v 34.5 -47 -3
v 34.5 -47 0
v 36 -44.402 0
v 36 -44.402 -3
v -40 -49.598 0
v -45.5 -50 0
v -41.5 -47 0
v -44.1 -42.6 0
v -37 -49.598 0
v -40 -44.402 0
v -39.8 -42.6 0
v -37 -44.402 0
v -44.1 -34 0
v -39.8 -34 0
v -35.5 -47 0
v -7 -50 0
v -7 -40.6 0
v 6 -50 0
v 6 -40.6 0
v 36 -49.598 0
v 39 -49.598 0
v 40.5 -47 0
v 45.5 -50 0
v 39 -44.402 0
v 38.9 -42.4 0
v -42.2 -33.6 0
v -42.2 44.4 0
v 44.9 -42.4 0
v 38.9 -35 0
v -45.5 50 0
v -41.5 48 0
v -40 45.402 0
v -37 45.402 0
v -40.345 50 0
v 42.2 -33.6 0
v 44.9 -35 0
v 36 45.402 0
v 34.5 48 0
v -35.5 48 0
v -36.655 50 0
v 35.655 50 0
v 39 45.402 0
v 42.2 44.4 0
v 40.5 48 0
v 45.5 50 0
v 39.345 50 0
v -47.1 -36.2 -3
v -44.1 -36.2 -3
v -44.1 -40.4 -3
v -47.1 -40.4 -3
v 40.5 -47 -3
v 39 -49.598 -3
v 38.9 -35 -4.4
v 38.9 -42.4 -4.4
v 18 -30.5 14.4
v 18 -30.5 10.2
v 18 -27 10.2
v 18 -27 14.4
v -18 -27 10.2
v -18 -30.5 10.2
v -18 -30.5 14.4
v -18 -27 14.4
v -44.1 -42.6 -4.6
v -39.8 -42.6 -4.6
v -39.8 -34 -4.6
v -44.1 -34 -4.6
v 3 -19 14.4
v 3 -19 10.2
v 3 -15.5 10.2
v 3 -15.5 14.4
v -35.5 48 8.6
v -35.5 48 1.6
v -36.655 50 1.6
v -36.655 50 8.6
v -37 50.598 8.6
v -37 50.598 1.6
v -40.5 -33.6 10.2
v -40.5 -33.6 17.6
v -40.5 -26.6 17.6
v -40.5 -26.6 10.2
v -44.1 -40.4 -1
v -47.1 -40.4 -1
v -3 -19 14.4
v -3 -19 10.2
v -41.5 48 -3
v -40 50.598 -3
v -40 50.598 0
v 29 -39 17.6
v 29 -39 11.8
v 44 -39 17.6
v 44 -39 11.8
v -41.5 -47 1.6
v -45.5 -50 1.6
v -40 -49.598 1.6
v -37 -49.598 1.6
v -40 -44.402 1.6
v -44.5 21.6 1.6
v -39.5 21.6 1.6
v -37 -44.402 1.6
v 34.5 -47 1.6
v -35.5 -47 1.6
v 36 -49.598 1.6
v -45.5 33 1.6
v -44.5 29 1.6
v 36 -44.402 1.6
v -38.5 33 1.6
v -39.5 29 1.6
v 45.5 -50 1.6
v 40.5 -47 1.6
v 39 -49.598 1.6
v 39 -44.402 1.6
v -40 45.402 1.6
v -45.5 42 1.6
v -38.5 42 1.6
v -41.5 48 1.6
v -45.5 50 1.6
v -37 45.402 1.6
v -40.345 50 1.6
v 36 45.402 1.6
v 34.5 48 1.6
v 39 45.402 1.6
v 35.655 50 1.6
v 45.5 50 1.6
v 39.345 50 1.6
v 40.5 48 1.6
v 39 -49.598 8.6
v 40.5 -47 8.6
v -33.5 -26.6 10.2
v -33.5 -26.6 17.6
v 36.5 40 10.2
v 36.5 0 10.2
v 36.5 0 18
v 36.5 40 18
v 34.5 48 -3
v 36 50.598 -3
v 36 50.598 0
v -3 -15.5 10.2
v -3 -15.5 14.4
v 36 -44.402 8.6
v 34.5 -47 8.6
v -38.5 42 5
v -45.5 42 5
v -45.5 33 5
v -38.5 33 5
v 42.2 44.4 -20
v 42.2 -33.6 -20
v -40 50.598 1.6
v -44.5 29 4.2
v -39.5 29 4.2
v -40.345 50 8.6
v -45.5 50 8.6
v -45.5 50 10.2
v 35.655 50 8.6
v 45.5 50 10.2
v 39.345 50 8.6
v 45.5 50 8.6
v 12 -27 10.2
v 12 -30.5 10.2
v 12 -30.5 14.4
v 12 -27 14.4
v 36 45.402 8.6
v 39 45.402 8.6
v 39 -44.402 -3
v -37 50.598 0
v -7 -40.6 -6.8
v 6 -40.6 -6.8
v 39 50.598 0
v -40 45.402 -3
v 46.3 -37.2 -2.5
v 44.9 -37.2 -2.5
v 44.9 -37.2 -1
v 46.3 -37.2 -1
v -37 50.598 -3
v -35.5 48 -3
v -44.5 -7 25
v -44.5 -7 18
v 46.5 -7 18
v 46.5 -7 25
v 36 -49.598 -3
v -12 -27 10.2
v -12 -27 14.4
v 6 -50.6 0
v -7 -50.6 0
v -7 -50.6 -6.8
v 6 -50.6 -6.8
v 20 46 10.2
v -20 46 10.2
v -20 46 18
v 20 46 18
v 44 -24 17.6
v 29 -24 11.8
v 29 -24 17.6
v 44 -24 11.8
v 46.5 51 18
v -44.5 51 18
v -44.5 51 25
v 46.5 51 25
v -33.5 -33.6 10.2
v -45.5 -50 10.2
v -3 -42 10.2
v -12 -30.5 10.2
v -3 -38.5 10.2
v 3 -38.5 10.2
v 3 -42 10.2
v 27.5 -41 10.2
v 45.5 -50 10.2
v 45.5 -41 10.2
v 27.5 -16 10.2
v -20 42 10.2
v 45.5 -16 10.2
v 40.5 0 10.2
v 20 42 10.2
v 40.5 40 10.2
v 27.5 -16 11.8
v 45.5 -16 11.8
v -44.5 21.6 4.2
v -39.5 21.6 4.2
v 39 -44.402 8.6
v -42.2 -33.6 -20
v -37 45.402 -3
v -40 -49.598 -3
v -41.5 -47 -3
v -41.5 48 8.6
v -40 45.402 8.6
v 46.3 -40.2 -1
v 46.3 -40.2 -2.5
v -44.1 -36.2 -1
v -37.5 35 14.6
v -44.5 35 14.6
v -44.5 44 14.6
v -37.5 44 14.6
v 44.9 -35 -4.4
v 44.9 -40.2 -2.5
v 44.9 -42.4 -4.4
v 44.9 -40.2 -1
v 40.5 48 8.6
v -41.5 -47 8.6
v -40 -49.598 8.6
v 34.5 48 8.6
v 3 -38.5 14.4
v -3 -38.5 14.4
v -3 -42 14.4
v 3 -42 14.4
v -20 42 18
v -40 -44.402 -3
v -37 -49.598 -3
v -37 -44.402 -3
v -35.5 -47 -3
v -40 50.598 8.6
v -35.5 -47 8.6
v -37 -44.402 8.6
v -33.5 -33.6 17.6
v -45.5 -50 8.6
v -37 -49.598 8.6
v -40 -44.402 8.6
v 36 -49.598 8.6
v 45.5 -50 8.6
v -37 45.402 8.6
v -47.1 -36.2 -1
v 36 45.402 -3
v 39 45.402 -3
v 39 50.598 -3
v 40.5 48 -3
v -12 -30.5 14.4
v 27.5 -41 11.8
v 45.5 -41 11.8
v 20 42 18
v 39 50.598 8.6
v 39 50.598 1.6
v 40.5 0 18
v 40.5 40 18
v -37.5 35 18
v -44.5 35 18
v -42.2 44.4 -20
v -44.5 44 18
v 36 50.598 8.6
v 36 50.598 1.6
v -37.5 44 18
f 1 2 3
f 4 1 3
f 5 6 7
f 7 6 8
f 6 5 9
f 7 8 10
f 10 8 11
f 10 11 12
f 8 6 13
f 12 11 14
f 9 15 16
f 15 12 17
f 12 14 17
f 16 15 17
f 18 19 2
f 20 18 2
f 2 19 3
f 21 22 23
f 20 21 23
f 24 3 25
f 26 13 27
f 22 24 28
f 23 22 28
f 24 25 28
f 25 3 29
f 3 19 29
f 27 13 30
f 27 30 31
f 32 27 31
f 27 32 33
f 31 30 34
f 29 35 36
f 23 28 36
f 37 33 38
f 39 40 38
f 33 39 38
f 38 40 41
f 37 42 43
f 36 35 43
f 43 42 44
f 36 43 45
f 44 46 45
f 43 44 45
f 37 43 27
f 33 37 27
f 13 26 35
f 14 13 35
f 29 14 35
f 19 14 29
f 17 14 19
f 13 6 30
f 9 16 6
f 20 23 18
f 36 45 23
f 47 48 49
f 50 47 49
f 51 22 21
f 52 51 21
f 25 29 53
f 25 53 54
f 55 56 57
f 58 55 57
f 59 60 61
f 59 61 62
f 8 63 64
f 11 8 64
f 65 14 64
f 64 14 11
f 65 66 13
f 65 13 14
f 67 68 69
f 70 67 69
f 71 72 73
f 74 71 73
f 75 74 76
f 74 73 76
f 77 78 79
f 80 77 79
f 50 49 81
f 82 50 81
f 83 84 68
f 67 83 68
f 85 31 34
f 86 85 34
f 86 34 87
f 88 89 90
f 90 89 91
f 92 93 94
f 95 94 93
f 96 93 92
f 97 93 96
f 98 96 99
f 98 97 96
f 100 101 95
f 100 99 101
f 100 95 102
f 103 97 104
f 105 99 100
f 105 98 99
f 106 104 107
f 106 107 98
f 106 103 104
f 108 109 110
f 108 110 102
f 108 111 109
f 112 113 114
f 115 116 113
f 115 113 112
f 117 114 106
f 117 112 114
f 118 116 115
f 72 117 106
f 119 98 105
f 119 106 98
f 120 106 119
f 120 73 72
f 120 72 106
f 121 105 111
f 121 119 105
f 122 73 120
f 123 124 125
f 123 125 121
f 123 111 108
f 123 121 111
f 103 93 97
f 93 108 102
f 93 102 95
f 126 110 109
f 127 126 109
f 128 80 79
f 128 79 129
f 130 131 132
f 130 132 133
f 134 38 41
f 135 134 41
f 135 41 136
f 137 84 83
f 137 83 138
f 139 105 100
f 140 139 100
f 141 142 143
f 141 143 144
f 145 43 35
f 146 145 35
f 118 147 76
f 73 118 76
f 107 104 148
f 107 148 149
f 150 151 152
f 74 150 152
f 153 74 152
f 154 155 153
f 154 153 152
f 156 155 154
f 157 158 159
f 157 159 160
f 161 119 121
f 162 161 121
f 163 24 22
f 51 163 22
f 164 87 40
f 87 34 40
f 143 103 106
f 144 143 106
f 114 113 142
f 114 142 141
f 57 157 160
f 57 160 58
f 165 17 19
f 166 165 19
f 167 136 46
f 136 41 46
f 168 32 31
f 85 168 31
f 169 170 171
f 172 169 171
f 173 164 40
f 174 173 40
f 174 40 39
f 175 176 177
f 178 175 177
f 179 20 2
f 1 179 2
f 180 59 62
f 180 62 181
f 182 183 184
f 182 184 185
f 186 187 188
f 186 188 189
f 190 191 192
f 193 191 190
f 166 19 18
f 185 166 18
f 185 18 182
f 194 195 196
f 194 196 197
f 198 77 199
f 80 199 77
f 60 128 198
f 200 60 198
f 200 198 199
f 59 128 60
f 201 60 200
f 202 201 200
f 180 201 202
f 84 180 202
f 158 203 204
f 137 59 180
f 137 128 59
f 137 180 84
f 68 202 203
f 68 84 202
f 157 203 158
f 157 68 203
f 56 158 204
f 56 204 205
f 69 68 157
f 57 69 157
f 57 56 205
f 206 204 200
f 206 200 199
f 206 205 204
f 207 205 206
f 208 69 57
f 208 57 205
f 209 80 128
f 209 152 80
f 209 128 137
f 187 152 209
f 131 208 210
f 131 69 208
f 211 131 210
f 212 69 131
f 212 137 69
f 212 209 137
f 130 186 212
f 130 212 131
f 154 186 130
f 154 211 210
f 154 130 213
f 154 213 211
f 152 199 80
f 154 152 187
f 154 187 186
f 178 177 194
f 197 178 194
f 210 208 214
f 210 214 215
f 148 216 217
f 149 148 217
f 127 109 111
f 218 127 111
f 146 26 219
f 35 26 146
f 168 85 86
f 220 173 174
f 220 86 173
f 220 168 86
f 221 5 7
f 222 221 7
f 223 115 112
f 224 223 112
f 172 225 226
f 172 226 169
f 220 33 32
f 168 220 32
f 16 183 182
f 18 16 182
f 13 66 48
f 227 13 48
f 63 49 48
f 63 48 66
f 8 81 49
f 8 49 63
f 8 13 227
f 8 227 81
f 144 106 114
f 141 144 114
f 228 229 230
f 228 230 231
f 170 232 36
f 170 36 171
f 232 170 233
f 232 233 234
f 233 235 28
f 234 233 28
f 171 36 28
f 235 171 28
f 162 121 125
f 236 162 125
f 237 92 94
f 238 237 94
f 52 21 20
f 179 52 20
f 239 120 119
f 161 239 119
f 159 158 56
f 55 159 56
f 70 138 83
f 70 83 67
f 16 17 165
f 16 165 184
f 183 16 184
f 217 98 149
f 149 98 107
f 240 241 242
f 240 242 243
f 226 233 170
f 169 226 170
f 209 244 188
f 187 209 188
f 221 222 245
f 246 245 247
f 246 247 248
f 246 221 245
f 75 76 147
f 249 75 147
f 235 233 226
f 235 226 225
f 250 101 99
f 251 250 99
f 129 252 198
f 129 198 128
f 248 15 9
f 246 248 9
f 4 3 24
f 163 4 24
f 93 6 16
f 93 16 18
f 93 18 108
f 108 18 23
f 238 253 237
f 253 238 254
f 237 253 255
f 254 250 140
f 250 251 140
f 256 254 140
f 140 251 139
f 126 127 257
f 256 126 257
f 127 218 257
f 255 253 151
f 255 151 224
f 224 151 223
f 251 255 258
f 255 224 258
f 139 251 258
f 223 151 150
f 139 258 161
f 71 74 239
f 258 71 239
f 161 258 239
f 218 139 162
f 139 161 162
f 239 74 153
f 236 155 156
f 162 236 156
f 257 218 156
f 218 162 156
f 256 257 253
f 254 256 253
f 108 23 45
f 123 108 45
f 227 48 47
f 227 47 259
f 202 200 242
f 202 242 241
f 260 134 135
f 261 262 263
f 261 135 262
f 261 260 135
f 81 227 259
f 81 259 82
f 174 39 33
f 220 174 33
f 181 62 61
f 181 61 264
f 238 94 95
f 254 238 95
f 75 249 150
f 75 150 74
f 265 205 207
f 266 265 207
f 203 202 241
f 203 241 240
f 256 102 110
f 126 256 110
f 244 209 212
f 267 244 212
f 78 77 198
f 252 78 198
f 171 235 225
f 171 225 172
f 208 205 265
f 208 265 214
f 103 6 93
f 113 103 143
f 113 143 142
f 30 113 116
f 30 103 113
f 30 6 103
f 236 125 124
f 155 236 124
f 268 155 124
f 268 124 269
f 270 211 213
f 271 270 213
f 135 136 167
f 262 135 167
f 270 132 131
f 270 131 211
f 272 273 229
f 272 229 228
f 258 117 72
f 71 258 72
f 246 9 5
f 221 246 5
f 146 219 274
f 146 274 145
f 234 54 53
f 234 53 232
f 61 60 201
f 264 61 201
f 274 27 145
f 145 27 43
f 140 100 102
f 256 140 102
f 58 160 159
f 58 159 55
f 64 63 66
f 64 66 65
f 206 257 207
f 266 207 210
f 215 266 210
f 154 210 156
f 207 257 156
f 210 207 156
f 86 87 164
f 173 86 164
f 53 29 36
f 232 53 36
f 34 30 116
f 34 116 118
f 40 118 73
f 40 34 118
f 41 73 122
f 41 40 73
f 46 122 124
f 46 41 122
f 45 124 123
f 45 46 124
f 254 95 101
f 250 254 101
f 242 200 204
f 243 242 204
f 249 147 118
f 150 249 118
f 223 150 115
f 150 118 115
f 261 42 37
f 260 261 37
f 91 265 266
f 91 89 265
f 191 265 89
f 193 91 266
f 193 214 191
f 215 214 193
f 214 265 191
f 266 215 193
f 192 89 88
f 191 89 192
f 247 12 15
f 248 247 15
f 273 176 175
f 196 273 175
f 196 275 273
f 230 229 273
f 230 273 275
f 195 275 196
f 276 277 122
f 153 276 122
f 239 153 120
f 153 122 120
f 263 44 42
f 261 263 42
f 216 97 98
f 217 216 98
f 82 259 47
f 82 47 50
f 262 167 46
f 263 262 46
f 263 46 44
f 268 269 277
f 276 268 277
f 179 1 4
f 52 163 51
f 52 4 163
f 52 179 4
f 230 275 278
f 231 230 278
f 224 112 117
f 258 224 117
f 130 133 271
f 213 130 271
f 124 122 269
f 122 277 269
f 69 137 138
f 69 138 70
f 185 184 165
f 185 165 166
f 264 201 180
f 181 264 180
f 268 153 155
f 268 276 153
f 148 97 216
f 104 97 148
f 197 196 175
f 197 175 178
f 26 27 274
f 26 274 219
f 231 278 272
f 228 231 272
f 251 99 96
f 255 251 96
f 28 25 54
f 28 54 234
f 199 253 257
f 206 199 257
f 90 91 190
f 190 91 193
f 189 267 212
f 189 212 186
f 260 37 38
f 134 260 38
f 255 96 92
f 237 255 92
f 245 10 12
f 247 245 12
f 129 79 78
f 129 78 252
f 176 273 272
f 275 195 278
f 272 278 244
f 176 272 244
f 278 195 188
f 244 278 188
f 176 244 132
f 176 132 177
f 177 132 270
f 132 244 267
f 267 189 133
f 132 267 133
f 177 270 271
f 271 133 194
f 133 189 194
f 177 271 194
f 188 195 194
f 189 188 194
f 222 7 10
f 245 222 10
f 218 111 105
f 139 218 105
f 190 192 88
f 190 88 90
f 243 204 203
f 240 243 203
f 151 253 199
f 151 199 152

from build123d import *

# Parameters (mm, degrees)
SKETCH001_W   = 91
SKETCH001_H   = 100
PAD_DEPTH     = 1.6
SKETCH002_W   = 84.4
SKETCH002_H   = 78
PAD001_DEPTH  = 20
SKETCH003_W   = 13
SKETCH003_H   = 10
PAD002_DEPTH  = 6.8
SKETCH004_W   = 4.3
SKETCH004_H   = 8.6
PAD003_DEPTH  = 4.6
SKETCH005_W   = 6
SKETCH005_H   = 7.4
PAD004_DEPTH  = 4.4
SKETCH006_W   = 4.2
SKETCH006_H   = 2
PAD005_DEPTH  = 3
SKETCH007_W   = 3
SKETCH007_H   = 1.5
PAD006_DEPTH  = 1.4
PAD007_DEPTH  = 7
SKETCH009_W   = 7
SKETCH009_H   = 9
PAD008_DEPTH  = 3.4
SKETCH010_W   = 5
SKETCH010_H   = 7.4
PAD009_DEPTH  = 2.6
SKETCH011_W   = 91
SKETCH011_H   = 100
PAD010_DEPTH  = 1.6
SKETCH012_W   = 40
SKETCH012_H   = 4
SKETCH012_W_2 = 4
SKETCH012_H_2 = 40
PAD011_DEPTH  = 7.8
SKETCH013_W   = 91
SKETCH013_H   = 58
PAD012_DEPTH  = 7
SKETCH014_W   = 7
SKETCH014_H   = 9
PAD013_DEPTH  = 3.4
PAD014_DEPTH  = 3
SKETCH035_W   = 6
SKETCH035_H   = 3.5
PAD021_DEPTH  = 4.2
SKETCH036_W   = 7
SKETCH036_H   = 7
PAD022_DEPTH  = 7.4
SKETCH037_W   = 18
SKETCH037_H   = 25
PAD023_DEPTH  = 1.6
SKETCH038_W   = 15
SKETCH038_H   = 15
PAD024_DEPTH  = 5.8


with BuildPart() as part:
    # Sketch001 → Pad (new body)
    with BuildSketch(Plane.XY):
        Rectangle(SKETCH001_W, SKETCH001_H)
    extrude(amount=PAD_DEPTH)

    # Sketch002 (on Face5 of Pad) → Pad001 (join)
    with BuildSketch(Plane(origin=(0, 0, 0), x_dir=(1, 0, 0), z_dir=(0, 0, -1))):
        with Locations((0, -5.4)):
            Rectangle(SKETCH002_W, SKETCH002_H)
    extrude(amount=PAD001_DEPTH)

    # Sketch003 (on Face4 of Pad001) → Pad002 (join)
    with BuildSketch(Plane(origin=(0, 0, 0), x_dir=(1, 0, 0), z_dir=(0, 0, -1))):
        with Locations((-0.5, 45.6)):
            Rectangle(SKETCH003_W, SKETCH003_H)
    extrude(amount=PAD002_DEPTH)

    # Sketch004 (on Face4 of Pad002) → Pad003 (join)
    with BuildSketch(Plane(origin=(0, 0, 0), x_dir=(1, 0, 0), z_dir=(0, 0, -1))):
        with Locations((-41.95, 38.3)):
            Rectangle(SKETCH004_W, SKETCH004_H)
    extrude(amount=PAD003_DEPTH)

    # Sketch005 (on Face4 of Pad003) → Pad004 (join)
    with BuildSketch(Plane(origin=(0, 0, 0), x_dir=(1, 0, 0), z_dir=(0, 0, -1))):
        with Locations((41.9, 38.7)):
            Rectangle(SKETCH005_W, SKETCH005_H)
    extrude(amount=PAD004_DEPTH)

    # Sketch006 (on Face14 of Pad004) → Pad005 (join)
    with BuildSketch(Plane(origin=(-44.1, 0, 0), x_dir=(0, -1, 0), z_dir=(-1, 0, 0))):
        with Locations((38.3, -2)):
            Rectangle(SKETCH006_W, SKETCH006_H)
    extrude(amount=PAD005_DEPTH)

    # Sketch007 (on Face12 of Pad005) → Pad006 (join)
    with BuildSketch(Plane.YZ.offset(44.9)):
        with Locations((-38.7, -1.75)):
            Rectangle(SKETCH007_W, SKETCH007_H)
    extrude(amount=PAD006_DEPTH)

    # Sketch008 (on Face5 of Pad006) → Pad007 (join)
    with BuildSketch(Plane.XY.offset(1.6)):
        Polygon((-40, 45.401924), (-37, 45.401924), (-35.5, 48), (-37, 50.598076), (-40, 50.598076), (-41.5, 48), align=None)
        Polygon((39, 45.401924), (40.5, 48), (39, 50.598076), (36, 50.598076), (34.5, 48), (36, 45.401924), align=None)
        Polygon((-37, -49.598076), (-35.5, -47), (-37, -44.401924), (-40, -44.401924), (-41.5, -47), (-40, -49.598076), align=None)
        Polygon((39, -49.598076), (40.5, -47), (39, -44.401924), (36, -44.401924), (34.5, -47), (36, -49.598076), align=None)
    extrude(amount=PAD007_DEPTH)

    # Sketch009 (on Face5 of Pad007) → Pad008 (join)
    with BuildSketch(Plane.XY.offset(1.6)):
        with Locations((-42, 37.5)):
            Rectangle(SKETCH009_W, SKETCH009_H)
    extrude(amount=PAD008_DEPTH)

    # Sketch010 (on Face5 of Pad008) → Pad009 (join)
    with BuildSketch(Plane.XY.offset(1.6)):
        with Locations((-42, 25.3)):
            Rectangle(SKETCH010_W, SKETCH010_H)
    extrude(amount=PAD009_DEPTH)

    # Sketch011 (on Face74 of Pad009) → Pad010 (join)
    with BuildSketch(Plane.XY.offset(8.6)):
        Rectangle(SKETCH011_W, SKETCH011_H)
    extrude(amount=PAD010_DEPTH)

    # Sketch012 (on Face81 of Pad010) → Pad011 (join)
    with BuildSketch(Plane.XY.offset(10.2)):
        with Locations((0, 44)):
            Rectangle(SKETCH012_W, SKETCH012_H)
        with Locations((38.5, 20)):
            Rectangle(SKETCH012_W_2, SKETCH012_H_2)
    extrude(amount=PAD011_DEPTH)

    # Sketch013 (on Face91 of Pad011) → Pad012 (join)
    with BuildSketch(Plane.XY.offset(18)):
        with Locations((1, 22)):
            Rectangle(SKETCH013_W, SKETCH013_H)
    extrude(amount=PAD012_DEPTH)

    # Sketch014 (on Face4 of Pad012) → Pad013 (join)
    with BuildSketch(Plane(origin=(0, 0, 18), x_dir=(1, 0, 0), z_dir=(0, 0, -1))):
        with Locations((-41, -39.5)):
            Rectangle(SKETCH014_W, SKETCH014_H)
    extrude(amount=PAD013_DEPTH)

    # Sketch015 (on Face66 of Pad013) → Pad014 (join)
    with BuildSketch(Plane(origin=(0, 0, 0), x_dir=(1, 0, 0), z_dir=(0, 0, -1))):
        Polygon((-35.5, 47), (-37, 49.598076), (-40, 49.598076), (-41.5, 47), (-40, 44.401924), (-37, 44.401924), align=None)
        Polygon((39, 44.401924), (40.5, 47), (39, 49.598076), (36, 49.598076), (34.5, 47), (36, 44.401924), align=None)
        Polygon((-37, -50.598076), (-35.5, -48), (-37, -45.401924), (-40, -45.401924), (-41.5, -48), (-40, -50.598076), align=None)
        Polygon((39, -50.598076), (40.5, -48), (39, -45.401924), (36, -45.401924), (34.5, -48), (36, -50.598076), align=None)
    extrude(amount=PAD014_DEPTH)

    # Sketch035 (on Face20 of Pad014) → Pad021 (join)
    with BuildSketch(Plane.XY.offset(10.2)):
        with Locations((-15, -28.75)):
            Rectangle(SKETCH035_W, SKETCH035_H)
        with Locations((0, -17.25)):
            Rectangle(SKETCH035_W, SKETCH035_H)
        with Locations((15, -28.75)):
            Rectangle(SKETCH035_W, SKETCH035_H)
        with Locations((0, -40.25)):
            Rectangle(SKETCH035_W, SKETCH035_H)
    extrude(amount=PAD021_DEPTH)

    # Sketch036 (on Face20 of Pad021) → Pad022 (join)
    with BuildSketch(Plane.XY.offset(10.2)):
        with Locations((-37, -30.1)):
            Rectangle(SKETCH036_W, SKETCH036_H)
    extrude(amount=PAD022_DEPTH)

    # Sketch037 (on Face20 of Pad022) → Pad023 (join)
    with BuildSketch(Plane.XY.offset(10.2)):
        with Locations((36.5, -28.5)):
            Rectangle(SKETCH037_W, SKETCH037_H)
    extrude(amount=PAD023_DEPTH)

    # Sketch038 (on Face50 of Pad023) → Pad024 (join)
    with BuildSketch(Plane.XY.offset(11.8)):
        with Locations((36.5, -31.5)):
            Rectangle(SKETCH038_W, SKETCH038_H)
    extrude(amount=PAD024_DEPTH)


solid = part.part
